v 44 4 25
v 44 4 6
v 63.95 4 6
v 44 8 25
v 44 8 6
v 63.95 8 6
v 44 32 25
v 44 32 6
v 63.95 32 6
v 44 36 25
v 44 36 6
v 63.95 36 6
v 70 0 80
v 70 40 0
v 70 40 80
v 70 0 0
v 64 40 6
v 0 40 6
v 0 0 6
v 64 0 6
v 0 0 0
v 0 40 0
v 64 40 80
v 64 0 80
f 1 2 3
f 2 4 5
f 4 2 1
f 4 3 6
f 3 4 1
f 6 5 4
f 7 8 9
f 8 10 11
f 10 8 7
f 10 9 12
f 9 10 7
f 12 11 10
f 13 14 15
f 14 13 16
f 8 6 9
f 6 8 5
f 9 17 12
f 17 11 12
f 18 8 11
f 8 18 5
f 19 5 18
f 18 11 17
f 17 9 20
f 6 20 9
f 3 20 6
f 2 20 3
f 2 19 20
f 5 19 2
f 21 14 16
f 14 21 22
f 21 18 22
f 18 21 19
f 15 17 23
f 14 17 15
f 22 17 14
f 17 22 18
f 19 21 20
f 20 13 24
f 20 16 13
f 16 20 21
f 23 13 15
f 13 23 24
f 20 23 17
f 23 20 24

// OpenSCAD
$fn = 32;

// ----------------------------------------------------------------------
// Rib bracket: 2-gusset L bracket
// ----------------------------------------------------------------------

// --- parameters (mm) ---
base_l = 70;              // foot length, X
base_w = 40;              // foot width, Y
base_t = 6;               // foot thickness
plate_t = 6;              // upright plate thickness
plate_h = 80;             // overall height
gus_l = 20;               // gusset leg along the foot
gus_h = 20;               // gusset height
gus_t = 4;                // gusset thickness
gus_edge = 4;             // gusset margin from the foot edge
n_gus = 2;                // gusset count

gus_pitch = (base_w - 2 * gus_edge - gus_t) / (n_gus - 1);  // gusset pitch

union() {
  cube([base_l, base_w, base_t]);
  translate([base_l - plate_t, 0, base_t - 1])
    cube([plate_t, base_w, plate_h - base_t + 1]);
  for (i = [0 : n_gus - 1])
    translate([base_l - plate_t - gus_l, gus_edge + i * gus_pitch, base_t - 1])
      rotate([-90, 0, 0])
        linear_extrude(height = gus_t)
          polygon(points = [[0, 0], [gus_l + 1, 0], [0, -gus_h]]);
}
